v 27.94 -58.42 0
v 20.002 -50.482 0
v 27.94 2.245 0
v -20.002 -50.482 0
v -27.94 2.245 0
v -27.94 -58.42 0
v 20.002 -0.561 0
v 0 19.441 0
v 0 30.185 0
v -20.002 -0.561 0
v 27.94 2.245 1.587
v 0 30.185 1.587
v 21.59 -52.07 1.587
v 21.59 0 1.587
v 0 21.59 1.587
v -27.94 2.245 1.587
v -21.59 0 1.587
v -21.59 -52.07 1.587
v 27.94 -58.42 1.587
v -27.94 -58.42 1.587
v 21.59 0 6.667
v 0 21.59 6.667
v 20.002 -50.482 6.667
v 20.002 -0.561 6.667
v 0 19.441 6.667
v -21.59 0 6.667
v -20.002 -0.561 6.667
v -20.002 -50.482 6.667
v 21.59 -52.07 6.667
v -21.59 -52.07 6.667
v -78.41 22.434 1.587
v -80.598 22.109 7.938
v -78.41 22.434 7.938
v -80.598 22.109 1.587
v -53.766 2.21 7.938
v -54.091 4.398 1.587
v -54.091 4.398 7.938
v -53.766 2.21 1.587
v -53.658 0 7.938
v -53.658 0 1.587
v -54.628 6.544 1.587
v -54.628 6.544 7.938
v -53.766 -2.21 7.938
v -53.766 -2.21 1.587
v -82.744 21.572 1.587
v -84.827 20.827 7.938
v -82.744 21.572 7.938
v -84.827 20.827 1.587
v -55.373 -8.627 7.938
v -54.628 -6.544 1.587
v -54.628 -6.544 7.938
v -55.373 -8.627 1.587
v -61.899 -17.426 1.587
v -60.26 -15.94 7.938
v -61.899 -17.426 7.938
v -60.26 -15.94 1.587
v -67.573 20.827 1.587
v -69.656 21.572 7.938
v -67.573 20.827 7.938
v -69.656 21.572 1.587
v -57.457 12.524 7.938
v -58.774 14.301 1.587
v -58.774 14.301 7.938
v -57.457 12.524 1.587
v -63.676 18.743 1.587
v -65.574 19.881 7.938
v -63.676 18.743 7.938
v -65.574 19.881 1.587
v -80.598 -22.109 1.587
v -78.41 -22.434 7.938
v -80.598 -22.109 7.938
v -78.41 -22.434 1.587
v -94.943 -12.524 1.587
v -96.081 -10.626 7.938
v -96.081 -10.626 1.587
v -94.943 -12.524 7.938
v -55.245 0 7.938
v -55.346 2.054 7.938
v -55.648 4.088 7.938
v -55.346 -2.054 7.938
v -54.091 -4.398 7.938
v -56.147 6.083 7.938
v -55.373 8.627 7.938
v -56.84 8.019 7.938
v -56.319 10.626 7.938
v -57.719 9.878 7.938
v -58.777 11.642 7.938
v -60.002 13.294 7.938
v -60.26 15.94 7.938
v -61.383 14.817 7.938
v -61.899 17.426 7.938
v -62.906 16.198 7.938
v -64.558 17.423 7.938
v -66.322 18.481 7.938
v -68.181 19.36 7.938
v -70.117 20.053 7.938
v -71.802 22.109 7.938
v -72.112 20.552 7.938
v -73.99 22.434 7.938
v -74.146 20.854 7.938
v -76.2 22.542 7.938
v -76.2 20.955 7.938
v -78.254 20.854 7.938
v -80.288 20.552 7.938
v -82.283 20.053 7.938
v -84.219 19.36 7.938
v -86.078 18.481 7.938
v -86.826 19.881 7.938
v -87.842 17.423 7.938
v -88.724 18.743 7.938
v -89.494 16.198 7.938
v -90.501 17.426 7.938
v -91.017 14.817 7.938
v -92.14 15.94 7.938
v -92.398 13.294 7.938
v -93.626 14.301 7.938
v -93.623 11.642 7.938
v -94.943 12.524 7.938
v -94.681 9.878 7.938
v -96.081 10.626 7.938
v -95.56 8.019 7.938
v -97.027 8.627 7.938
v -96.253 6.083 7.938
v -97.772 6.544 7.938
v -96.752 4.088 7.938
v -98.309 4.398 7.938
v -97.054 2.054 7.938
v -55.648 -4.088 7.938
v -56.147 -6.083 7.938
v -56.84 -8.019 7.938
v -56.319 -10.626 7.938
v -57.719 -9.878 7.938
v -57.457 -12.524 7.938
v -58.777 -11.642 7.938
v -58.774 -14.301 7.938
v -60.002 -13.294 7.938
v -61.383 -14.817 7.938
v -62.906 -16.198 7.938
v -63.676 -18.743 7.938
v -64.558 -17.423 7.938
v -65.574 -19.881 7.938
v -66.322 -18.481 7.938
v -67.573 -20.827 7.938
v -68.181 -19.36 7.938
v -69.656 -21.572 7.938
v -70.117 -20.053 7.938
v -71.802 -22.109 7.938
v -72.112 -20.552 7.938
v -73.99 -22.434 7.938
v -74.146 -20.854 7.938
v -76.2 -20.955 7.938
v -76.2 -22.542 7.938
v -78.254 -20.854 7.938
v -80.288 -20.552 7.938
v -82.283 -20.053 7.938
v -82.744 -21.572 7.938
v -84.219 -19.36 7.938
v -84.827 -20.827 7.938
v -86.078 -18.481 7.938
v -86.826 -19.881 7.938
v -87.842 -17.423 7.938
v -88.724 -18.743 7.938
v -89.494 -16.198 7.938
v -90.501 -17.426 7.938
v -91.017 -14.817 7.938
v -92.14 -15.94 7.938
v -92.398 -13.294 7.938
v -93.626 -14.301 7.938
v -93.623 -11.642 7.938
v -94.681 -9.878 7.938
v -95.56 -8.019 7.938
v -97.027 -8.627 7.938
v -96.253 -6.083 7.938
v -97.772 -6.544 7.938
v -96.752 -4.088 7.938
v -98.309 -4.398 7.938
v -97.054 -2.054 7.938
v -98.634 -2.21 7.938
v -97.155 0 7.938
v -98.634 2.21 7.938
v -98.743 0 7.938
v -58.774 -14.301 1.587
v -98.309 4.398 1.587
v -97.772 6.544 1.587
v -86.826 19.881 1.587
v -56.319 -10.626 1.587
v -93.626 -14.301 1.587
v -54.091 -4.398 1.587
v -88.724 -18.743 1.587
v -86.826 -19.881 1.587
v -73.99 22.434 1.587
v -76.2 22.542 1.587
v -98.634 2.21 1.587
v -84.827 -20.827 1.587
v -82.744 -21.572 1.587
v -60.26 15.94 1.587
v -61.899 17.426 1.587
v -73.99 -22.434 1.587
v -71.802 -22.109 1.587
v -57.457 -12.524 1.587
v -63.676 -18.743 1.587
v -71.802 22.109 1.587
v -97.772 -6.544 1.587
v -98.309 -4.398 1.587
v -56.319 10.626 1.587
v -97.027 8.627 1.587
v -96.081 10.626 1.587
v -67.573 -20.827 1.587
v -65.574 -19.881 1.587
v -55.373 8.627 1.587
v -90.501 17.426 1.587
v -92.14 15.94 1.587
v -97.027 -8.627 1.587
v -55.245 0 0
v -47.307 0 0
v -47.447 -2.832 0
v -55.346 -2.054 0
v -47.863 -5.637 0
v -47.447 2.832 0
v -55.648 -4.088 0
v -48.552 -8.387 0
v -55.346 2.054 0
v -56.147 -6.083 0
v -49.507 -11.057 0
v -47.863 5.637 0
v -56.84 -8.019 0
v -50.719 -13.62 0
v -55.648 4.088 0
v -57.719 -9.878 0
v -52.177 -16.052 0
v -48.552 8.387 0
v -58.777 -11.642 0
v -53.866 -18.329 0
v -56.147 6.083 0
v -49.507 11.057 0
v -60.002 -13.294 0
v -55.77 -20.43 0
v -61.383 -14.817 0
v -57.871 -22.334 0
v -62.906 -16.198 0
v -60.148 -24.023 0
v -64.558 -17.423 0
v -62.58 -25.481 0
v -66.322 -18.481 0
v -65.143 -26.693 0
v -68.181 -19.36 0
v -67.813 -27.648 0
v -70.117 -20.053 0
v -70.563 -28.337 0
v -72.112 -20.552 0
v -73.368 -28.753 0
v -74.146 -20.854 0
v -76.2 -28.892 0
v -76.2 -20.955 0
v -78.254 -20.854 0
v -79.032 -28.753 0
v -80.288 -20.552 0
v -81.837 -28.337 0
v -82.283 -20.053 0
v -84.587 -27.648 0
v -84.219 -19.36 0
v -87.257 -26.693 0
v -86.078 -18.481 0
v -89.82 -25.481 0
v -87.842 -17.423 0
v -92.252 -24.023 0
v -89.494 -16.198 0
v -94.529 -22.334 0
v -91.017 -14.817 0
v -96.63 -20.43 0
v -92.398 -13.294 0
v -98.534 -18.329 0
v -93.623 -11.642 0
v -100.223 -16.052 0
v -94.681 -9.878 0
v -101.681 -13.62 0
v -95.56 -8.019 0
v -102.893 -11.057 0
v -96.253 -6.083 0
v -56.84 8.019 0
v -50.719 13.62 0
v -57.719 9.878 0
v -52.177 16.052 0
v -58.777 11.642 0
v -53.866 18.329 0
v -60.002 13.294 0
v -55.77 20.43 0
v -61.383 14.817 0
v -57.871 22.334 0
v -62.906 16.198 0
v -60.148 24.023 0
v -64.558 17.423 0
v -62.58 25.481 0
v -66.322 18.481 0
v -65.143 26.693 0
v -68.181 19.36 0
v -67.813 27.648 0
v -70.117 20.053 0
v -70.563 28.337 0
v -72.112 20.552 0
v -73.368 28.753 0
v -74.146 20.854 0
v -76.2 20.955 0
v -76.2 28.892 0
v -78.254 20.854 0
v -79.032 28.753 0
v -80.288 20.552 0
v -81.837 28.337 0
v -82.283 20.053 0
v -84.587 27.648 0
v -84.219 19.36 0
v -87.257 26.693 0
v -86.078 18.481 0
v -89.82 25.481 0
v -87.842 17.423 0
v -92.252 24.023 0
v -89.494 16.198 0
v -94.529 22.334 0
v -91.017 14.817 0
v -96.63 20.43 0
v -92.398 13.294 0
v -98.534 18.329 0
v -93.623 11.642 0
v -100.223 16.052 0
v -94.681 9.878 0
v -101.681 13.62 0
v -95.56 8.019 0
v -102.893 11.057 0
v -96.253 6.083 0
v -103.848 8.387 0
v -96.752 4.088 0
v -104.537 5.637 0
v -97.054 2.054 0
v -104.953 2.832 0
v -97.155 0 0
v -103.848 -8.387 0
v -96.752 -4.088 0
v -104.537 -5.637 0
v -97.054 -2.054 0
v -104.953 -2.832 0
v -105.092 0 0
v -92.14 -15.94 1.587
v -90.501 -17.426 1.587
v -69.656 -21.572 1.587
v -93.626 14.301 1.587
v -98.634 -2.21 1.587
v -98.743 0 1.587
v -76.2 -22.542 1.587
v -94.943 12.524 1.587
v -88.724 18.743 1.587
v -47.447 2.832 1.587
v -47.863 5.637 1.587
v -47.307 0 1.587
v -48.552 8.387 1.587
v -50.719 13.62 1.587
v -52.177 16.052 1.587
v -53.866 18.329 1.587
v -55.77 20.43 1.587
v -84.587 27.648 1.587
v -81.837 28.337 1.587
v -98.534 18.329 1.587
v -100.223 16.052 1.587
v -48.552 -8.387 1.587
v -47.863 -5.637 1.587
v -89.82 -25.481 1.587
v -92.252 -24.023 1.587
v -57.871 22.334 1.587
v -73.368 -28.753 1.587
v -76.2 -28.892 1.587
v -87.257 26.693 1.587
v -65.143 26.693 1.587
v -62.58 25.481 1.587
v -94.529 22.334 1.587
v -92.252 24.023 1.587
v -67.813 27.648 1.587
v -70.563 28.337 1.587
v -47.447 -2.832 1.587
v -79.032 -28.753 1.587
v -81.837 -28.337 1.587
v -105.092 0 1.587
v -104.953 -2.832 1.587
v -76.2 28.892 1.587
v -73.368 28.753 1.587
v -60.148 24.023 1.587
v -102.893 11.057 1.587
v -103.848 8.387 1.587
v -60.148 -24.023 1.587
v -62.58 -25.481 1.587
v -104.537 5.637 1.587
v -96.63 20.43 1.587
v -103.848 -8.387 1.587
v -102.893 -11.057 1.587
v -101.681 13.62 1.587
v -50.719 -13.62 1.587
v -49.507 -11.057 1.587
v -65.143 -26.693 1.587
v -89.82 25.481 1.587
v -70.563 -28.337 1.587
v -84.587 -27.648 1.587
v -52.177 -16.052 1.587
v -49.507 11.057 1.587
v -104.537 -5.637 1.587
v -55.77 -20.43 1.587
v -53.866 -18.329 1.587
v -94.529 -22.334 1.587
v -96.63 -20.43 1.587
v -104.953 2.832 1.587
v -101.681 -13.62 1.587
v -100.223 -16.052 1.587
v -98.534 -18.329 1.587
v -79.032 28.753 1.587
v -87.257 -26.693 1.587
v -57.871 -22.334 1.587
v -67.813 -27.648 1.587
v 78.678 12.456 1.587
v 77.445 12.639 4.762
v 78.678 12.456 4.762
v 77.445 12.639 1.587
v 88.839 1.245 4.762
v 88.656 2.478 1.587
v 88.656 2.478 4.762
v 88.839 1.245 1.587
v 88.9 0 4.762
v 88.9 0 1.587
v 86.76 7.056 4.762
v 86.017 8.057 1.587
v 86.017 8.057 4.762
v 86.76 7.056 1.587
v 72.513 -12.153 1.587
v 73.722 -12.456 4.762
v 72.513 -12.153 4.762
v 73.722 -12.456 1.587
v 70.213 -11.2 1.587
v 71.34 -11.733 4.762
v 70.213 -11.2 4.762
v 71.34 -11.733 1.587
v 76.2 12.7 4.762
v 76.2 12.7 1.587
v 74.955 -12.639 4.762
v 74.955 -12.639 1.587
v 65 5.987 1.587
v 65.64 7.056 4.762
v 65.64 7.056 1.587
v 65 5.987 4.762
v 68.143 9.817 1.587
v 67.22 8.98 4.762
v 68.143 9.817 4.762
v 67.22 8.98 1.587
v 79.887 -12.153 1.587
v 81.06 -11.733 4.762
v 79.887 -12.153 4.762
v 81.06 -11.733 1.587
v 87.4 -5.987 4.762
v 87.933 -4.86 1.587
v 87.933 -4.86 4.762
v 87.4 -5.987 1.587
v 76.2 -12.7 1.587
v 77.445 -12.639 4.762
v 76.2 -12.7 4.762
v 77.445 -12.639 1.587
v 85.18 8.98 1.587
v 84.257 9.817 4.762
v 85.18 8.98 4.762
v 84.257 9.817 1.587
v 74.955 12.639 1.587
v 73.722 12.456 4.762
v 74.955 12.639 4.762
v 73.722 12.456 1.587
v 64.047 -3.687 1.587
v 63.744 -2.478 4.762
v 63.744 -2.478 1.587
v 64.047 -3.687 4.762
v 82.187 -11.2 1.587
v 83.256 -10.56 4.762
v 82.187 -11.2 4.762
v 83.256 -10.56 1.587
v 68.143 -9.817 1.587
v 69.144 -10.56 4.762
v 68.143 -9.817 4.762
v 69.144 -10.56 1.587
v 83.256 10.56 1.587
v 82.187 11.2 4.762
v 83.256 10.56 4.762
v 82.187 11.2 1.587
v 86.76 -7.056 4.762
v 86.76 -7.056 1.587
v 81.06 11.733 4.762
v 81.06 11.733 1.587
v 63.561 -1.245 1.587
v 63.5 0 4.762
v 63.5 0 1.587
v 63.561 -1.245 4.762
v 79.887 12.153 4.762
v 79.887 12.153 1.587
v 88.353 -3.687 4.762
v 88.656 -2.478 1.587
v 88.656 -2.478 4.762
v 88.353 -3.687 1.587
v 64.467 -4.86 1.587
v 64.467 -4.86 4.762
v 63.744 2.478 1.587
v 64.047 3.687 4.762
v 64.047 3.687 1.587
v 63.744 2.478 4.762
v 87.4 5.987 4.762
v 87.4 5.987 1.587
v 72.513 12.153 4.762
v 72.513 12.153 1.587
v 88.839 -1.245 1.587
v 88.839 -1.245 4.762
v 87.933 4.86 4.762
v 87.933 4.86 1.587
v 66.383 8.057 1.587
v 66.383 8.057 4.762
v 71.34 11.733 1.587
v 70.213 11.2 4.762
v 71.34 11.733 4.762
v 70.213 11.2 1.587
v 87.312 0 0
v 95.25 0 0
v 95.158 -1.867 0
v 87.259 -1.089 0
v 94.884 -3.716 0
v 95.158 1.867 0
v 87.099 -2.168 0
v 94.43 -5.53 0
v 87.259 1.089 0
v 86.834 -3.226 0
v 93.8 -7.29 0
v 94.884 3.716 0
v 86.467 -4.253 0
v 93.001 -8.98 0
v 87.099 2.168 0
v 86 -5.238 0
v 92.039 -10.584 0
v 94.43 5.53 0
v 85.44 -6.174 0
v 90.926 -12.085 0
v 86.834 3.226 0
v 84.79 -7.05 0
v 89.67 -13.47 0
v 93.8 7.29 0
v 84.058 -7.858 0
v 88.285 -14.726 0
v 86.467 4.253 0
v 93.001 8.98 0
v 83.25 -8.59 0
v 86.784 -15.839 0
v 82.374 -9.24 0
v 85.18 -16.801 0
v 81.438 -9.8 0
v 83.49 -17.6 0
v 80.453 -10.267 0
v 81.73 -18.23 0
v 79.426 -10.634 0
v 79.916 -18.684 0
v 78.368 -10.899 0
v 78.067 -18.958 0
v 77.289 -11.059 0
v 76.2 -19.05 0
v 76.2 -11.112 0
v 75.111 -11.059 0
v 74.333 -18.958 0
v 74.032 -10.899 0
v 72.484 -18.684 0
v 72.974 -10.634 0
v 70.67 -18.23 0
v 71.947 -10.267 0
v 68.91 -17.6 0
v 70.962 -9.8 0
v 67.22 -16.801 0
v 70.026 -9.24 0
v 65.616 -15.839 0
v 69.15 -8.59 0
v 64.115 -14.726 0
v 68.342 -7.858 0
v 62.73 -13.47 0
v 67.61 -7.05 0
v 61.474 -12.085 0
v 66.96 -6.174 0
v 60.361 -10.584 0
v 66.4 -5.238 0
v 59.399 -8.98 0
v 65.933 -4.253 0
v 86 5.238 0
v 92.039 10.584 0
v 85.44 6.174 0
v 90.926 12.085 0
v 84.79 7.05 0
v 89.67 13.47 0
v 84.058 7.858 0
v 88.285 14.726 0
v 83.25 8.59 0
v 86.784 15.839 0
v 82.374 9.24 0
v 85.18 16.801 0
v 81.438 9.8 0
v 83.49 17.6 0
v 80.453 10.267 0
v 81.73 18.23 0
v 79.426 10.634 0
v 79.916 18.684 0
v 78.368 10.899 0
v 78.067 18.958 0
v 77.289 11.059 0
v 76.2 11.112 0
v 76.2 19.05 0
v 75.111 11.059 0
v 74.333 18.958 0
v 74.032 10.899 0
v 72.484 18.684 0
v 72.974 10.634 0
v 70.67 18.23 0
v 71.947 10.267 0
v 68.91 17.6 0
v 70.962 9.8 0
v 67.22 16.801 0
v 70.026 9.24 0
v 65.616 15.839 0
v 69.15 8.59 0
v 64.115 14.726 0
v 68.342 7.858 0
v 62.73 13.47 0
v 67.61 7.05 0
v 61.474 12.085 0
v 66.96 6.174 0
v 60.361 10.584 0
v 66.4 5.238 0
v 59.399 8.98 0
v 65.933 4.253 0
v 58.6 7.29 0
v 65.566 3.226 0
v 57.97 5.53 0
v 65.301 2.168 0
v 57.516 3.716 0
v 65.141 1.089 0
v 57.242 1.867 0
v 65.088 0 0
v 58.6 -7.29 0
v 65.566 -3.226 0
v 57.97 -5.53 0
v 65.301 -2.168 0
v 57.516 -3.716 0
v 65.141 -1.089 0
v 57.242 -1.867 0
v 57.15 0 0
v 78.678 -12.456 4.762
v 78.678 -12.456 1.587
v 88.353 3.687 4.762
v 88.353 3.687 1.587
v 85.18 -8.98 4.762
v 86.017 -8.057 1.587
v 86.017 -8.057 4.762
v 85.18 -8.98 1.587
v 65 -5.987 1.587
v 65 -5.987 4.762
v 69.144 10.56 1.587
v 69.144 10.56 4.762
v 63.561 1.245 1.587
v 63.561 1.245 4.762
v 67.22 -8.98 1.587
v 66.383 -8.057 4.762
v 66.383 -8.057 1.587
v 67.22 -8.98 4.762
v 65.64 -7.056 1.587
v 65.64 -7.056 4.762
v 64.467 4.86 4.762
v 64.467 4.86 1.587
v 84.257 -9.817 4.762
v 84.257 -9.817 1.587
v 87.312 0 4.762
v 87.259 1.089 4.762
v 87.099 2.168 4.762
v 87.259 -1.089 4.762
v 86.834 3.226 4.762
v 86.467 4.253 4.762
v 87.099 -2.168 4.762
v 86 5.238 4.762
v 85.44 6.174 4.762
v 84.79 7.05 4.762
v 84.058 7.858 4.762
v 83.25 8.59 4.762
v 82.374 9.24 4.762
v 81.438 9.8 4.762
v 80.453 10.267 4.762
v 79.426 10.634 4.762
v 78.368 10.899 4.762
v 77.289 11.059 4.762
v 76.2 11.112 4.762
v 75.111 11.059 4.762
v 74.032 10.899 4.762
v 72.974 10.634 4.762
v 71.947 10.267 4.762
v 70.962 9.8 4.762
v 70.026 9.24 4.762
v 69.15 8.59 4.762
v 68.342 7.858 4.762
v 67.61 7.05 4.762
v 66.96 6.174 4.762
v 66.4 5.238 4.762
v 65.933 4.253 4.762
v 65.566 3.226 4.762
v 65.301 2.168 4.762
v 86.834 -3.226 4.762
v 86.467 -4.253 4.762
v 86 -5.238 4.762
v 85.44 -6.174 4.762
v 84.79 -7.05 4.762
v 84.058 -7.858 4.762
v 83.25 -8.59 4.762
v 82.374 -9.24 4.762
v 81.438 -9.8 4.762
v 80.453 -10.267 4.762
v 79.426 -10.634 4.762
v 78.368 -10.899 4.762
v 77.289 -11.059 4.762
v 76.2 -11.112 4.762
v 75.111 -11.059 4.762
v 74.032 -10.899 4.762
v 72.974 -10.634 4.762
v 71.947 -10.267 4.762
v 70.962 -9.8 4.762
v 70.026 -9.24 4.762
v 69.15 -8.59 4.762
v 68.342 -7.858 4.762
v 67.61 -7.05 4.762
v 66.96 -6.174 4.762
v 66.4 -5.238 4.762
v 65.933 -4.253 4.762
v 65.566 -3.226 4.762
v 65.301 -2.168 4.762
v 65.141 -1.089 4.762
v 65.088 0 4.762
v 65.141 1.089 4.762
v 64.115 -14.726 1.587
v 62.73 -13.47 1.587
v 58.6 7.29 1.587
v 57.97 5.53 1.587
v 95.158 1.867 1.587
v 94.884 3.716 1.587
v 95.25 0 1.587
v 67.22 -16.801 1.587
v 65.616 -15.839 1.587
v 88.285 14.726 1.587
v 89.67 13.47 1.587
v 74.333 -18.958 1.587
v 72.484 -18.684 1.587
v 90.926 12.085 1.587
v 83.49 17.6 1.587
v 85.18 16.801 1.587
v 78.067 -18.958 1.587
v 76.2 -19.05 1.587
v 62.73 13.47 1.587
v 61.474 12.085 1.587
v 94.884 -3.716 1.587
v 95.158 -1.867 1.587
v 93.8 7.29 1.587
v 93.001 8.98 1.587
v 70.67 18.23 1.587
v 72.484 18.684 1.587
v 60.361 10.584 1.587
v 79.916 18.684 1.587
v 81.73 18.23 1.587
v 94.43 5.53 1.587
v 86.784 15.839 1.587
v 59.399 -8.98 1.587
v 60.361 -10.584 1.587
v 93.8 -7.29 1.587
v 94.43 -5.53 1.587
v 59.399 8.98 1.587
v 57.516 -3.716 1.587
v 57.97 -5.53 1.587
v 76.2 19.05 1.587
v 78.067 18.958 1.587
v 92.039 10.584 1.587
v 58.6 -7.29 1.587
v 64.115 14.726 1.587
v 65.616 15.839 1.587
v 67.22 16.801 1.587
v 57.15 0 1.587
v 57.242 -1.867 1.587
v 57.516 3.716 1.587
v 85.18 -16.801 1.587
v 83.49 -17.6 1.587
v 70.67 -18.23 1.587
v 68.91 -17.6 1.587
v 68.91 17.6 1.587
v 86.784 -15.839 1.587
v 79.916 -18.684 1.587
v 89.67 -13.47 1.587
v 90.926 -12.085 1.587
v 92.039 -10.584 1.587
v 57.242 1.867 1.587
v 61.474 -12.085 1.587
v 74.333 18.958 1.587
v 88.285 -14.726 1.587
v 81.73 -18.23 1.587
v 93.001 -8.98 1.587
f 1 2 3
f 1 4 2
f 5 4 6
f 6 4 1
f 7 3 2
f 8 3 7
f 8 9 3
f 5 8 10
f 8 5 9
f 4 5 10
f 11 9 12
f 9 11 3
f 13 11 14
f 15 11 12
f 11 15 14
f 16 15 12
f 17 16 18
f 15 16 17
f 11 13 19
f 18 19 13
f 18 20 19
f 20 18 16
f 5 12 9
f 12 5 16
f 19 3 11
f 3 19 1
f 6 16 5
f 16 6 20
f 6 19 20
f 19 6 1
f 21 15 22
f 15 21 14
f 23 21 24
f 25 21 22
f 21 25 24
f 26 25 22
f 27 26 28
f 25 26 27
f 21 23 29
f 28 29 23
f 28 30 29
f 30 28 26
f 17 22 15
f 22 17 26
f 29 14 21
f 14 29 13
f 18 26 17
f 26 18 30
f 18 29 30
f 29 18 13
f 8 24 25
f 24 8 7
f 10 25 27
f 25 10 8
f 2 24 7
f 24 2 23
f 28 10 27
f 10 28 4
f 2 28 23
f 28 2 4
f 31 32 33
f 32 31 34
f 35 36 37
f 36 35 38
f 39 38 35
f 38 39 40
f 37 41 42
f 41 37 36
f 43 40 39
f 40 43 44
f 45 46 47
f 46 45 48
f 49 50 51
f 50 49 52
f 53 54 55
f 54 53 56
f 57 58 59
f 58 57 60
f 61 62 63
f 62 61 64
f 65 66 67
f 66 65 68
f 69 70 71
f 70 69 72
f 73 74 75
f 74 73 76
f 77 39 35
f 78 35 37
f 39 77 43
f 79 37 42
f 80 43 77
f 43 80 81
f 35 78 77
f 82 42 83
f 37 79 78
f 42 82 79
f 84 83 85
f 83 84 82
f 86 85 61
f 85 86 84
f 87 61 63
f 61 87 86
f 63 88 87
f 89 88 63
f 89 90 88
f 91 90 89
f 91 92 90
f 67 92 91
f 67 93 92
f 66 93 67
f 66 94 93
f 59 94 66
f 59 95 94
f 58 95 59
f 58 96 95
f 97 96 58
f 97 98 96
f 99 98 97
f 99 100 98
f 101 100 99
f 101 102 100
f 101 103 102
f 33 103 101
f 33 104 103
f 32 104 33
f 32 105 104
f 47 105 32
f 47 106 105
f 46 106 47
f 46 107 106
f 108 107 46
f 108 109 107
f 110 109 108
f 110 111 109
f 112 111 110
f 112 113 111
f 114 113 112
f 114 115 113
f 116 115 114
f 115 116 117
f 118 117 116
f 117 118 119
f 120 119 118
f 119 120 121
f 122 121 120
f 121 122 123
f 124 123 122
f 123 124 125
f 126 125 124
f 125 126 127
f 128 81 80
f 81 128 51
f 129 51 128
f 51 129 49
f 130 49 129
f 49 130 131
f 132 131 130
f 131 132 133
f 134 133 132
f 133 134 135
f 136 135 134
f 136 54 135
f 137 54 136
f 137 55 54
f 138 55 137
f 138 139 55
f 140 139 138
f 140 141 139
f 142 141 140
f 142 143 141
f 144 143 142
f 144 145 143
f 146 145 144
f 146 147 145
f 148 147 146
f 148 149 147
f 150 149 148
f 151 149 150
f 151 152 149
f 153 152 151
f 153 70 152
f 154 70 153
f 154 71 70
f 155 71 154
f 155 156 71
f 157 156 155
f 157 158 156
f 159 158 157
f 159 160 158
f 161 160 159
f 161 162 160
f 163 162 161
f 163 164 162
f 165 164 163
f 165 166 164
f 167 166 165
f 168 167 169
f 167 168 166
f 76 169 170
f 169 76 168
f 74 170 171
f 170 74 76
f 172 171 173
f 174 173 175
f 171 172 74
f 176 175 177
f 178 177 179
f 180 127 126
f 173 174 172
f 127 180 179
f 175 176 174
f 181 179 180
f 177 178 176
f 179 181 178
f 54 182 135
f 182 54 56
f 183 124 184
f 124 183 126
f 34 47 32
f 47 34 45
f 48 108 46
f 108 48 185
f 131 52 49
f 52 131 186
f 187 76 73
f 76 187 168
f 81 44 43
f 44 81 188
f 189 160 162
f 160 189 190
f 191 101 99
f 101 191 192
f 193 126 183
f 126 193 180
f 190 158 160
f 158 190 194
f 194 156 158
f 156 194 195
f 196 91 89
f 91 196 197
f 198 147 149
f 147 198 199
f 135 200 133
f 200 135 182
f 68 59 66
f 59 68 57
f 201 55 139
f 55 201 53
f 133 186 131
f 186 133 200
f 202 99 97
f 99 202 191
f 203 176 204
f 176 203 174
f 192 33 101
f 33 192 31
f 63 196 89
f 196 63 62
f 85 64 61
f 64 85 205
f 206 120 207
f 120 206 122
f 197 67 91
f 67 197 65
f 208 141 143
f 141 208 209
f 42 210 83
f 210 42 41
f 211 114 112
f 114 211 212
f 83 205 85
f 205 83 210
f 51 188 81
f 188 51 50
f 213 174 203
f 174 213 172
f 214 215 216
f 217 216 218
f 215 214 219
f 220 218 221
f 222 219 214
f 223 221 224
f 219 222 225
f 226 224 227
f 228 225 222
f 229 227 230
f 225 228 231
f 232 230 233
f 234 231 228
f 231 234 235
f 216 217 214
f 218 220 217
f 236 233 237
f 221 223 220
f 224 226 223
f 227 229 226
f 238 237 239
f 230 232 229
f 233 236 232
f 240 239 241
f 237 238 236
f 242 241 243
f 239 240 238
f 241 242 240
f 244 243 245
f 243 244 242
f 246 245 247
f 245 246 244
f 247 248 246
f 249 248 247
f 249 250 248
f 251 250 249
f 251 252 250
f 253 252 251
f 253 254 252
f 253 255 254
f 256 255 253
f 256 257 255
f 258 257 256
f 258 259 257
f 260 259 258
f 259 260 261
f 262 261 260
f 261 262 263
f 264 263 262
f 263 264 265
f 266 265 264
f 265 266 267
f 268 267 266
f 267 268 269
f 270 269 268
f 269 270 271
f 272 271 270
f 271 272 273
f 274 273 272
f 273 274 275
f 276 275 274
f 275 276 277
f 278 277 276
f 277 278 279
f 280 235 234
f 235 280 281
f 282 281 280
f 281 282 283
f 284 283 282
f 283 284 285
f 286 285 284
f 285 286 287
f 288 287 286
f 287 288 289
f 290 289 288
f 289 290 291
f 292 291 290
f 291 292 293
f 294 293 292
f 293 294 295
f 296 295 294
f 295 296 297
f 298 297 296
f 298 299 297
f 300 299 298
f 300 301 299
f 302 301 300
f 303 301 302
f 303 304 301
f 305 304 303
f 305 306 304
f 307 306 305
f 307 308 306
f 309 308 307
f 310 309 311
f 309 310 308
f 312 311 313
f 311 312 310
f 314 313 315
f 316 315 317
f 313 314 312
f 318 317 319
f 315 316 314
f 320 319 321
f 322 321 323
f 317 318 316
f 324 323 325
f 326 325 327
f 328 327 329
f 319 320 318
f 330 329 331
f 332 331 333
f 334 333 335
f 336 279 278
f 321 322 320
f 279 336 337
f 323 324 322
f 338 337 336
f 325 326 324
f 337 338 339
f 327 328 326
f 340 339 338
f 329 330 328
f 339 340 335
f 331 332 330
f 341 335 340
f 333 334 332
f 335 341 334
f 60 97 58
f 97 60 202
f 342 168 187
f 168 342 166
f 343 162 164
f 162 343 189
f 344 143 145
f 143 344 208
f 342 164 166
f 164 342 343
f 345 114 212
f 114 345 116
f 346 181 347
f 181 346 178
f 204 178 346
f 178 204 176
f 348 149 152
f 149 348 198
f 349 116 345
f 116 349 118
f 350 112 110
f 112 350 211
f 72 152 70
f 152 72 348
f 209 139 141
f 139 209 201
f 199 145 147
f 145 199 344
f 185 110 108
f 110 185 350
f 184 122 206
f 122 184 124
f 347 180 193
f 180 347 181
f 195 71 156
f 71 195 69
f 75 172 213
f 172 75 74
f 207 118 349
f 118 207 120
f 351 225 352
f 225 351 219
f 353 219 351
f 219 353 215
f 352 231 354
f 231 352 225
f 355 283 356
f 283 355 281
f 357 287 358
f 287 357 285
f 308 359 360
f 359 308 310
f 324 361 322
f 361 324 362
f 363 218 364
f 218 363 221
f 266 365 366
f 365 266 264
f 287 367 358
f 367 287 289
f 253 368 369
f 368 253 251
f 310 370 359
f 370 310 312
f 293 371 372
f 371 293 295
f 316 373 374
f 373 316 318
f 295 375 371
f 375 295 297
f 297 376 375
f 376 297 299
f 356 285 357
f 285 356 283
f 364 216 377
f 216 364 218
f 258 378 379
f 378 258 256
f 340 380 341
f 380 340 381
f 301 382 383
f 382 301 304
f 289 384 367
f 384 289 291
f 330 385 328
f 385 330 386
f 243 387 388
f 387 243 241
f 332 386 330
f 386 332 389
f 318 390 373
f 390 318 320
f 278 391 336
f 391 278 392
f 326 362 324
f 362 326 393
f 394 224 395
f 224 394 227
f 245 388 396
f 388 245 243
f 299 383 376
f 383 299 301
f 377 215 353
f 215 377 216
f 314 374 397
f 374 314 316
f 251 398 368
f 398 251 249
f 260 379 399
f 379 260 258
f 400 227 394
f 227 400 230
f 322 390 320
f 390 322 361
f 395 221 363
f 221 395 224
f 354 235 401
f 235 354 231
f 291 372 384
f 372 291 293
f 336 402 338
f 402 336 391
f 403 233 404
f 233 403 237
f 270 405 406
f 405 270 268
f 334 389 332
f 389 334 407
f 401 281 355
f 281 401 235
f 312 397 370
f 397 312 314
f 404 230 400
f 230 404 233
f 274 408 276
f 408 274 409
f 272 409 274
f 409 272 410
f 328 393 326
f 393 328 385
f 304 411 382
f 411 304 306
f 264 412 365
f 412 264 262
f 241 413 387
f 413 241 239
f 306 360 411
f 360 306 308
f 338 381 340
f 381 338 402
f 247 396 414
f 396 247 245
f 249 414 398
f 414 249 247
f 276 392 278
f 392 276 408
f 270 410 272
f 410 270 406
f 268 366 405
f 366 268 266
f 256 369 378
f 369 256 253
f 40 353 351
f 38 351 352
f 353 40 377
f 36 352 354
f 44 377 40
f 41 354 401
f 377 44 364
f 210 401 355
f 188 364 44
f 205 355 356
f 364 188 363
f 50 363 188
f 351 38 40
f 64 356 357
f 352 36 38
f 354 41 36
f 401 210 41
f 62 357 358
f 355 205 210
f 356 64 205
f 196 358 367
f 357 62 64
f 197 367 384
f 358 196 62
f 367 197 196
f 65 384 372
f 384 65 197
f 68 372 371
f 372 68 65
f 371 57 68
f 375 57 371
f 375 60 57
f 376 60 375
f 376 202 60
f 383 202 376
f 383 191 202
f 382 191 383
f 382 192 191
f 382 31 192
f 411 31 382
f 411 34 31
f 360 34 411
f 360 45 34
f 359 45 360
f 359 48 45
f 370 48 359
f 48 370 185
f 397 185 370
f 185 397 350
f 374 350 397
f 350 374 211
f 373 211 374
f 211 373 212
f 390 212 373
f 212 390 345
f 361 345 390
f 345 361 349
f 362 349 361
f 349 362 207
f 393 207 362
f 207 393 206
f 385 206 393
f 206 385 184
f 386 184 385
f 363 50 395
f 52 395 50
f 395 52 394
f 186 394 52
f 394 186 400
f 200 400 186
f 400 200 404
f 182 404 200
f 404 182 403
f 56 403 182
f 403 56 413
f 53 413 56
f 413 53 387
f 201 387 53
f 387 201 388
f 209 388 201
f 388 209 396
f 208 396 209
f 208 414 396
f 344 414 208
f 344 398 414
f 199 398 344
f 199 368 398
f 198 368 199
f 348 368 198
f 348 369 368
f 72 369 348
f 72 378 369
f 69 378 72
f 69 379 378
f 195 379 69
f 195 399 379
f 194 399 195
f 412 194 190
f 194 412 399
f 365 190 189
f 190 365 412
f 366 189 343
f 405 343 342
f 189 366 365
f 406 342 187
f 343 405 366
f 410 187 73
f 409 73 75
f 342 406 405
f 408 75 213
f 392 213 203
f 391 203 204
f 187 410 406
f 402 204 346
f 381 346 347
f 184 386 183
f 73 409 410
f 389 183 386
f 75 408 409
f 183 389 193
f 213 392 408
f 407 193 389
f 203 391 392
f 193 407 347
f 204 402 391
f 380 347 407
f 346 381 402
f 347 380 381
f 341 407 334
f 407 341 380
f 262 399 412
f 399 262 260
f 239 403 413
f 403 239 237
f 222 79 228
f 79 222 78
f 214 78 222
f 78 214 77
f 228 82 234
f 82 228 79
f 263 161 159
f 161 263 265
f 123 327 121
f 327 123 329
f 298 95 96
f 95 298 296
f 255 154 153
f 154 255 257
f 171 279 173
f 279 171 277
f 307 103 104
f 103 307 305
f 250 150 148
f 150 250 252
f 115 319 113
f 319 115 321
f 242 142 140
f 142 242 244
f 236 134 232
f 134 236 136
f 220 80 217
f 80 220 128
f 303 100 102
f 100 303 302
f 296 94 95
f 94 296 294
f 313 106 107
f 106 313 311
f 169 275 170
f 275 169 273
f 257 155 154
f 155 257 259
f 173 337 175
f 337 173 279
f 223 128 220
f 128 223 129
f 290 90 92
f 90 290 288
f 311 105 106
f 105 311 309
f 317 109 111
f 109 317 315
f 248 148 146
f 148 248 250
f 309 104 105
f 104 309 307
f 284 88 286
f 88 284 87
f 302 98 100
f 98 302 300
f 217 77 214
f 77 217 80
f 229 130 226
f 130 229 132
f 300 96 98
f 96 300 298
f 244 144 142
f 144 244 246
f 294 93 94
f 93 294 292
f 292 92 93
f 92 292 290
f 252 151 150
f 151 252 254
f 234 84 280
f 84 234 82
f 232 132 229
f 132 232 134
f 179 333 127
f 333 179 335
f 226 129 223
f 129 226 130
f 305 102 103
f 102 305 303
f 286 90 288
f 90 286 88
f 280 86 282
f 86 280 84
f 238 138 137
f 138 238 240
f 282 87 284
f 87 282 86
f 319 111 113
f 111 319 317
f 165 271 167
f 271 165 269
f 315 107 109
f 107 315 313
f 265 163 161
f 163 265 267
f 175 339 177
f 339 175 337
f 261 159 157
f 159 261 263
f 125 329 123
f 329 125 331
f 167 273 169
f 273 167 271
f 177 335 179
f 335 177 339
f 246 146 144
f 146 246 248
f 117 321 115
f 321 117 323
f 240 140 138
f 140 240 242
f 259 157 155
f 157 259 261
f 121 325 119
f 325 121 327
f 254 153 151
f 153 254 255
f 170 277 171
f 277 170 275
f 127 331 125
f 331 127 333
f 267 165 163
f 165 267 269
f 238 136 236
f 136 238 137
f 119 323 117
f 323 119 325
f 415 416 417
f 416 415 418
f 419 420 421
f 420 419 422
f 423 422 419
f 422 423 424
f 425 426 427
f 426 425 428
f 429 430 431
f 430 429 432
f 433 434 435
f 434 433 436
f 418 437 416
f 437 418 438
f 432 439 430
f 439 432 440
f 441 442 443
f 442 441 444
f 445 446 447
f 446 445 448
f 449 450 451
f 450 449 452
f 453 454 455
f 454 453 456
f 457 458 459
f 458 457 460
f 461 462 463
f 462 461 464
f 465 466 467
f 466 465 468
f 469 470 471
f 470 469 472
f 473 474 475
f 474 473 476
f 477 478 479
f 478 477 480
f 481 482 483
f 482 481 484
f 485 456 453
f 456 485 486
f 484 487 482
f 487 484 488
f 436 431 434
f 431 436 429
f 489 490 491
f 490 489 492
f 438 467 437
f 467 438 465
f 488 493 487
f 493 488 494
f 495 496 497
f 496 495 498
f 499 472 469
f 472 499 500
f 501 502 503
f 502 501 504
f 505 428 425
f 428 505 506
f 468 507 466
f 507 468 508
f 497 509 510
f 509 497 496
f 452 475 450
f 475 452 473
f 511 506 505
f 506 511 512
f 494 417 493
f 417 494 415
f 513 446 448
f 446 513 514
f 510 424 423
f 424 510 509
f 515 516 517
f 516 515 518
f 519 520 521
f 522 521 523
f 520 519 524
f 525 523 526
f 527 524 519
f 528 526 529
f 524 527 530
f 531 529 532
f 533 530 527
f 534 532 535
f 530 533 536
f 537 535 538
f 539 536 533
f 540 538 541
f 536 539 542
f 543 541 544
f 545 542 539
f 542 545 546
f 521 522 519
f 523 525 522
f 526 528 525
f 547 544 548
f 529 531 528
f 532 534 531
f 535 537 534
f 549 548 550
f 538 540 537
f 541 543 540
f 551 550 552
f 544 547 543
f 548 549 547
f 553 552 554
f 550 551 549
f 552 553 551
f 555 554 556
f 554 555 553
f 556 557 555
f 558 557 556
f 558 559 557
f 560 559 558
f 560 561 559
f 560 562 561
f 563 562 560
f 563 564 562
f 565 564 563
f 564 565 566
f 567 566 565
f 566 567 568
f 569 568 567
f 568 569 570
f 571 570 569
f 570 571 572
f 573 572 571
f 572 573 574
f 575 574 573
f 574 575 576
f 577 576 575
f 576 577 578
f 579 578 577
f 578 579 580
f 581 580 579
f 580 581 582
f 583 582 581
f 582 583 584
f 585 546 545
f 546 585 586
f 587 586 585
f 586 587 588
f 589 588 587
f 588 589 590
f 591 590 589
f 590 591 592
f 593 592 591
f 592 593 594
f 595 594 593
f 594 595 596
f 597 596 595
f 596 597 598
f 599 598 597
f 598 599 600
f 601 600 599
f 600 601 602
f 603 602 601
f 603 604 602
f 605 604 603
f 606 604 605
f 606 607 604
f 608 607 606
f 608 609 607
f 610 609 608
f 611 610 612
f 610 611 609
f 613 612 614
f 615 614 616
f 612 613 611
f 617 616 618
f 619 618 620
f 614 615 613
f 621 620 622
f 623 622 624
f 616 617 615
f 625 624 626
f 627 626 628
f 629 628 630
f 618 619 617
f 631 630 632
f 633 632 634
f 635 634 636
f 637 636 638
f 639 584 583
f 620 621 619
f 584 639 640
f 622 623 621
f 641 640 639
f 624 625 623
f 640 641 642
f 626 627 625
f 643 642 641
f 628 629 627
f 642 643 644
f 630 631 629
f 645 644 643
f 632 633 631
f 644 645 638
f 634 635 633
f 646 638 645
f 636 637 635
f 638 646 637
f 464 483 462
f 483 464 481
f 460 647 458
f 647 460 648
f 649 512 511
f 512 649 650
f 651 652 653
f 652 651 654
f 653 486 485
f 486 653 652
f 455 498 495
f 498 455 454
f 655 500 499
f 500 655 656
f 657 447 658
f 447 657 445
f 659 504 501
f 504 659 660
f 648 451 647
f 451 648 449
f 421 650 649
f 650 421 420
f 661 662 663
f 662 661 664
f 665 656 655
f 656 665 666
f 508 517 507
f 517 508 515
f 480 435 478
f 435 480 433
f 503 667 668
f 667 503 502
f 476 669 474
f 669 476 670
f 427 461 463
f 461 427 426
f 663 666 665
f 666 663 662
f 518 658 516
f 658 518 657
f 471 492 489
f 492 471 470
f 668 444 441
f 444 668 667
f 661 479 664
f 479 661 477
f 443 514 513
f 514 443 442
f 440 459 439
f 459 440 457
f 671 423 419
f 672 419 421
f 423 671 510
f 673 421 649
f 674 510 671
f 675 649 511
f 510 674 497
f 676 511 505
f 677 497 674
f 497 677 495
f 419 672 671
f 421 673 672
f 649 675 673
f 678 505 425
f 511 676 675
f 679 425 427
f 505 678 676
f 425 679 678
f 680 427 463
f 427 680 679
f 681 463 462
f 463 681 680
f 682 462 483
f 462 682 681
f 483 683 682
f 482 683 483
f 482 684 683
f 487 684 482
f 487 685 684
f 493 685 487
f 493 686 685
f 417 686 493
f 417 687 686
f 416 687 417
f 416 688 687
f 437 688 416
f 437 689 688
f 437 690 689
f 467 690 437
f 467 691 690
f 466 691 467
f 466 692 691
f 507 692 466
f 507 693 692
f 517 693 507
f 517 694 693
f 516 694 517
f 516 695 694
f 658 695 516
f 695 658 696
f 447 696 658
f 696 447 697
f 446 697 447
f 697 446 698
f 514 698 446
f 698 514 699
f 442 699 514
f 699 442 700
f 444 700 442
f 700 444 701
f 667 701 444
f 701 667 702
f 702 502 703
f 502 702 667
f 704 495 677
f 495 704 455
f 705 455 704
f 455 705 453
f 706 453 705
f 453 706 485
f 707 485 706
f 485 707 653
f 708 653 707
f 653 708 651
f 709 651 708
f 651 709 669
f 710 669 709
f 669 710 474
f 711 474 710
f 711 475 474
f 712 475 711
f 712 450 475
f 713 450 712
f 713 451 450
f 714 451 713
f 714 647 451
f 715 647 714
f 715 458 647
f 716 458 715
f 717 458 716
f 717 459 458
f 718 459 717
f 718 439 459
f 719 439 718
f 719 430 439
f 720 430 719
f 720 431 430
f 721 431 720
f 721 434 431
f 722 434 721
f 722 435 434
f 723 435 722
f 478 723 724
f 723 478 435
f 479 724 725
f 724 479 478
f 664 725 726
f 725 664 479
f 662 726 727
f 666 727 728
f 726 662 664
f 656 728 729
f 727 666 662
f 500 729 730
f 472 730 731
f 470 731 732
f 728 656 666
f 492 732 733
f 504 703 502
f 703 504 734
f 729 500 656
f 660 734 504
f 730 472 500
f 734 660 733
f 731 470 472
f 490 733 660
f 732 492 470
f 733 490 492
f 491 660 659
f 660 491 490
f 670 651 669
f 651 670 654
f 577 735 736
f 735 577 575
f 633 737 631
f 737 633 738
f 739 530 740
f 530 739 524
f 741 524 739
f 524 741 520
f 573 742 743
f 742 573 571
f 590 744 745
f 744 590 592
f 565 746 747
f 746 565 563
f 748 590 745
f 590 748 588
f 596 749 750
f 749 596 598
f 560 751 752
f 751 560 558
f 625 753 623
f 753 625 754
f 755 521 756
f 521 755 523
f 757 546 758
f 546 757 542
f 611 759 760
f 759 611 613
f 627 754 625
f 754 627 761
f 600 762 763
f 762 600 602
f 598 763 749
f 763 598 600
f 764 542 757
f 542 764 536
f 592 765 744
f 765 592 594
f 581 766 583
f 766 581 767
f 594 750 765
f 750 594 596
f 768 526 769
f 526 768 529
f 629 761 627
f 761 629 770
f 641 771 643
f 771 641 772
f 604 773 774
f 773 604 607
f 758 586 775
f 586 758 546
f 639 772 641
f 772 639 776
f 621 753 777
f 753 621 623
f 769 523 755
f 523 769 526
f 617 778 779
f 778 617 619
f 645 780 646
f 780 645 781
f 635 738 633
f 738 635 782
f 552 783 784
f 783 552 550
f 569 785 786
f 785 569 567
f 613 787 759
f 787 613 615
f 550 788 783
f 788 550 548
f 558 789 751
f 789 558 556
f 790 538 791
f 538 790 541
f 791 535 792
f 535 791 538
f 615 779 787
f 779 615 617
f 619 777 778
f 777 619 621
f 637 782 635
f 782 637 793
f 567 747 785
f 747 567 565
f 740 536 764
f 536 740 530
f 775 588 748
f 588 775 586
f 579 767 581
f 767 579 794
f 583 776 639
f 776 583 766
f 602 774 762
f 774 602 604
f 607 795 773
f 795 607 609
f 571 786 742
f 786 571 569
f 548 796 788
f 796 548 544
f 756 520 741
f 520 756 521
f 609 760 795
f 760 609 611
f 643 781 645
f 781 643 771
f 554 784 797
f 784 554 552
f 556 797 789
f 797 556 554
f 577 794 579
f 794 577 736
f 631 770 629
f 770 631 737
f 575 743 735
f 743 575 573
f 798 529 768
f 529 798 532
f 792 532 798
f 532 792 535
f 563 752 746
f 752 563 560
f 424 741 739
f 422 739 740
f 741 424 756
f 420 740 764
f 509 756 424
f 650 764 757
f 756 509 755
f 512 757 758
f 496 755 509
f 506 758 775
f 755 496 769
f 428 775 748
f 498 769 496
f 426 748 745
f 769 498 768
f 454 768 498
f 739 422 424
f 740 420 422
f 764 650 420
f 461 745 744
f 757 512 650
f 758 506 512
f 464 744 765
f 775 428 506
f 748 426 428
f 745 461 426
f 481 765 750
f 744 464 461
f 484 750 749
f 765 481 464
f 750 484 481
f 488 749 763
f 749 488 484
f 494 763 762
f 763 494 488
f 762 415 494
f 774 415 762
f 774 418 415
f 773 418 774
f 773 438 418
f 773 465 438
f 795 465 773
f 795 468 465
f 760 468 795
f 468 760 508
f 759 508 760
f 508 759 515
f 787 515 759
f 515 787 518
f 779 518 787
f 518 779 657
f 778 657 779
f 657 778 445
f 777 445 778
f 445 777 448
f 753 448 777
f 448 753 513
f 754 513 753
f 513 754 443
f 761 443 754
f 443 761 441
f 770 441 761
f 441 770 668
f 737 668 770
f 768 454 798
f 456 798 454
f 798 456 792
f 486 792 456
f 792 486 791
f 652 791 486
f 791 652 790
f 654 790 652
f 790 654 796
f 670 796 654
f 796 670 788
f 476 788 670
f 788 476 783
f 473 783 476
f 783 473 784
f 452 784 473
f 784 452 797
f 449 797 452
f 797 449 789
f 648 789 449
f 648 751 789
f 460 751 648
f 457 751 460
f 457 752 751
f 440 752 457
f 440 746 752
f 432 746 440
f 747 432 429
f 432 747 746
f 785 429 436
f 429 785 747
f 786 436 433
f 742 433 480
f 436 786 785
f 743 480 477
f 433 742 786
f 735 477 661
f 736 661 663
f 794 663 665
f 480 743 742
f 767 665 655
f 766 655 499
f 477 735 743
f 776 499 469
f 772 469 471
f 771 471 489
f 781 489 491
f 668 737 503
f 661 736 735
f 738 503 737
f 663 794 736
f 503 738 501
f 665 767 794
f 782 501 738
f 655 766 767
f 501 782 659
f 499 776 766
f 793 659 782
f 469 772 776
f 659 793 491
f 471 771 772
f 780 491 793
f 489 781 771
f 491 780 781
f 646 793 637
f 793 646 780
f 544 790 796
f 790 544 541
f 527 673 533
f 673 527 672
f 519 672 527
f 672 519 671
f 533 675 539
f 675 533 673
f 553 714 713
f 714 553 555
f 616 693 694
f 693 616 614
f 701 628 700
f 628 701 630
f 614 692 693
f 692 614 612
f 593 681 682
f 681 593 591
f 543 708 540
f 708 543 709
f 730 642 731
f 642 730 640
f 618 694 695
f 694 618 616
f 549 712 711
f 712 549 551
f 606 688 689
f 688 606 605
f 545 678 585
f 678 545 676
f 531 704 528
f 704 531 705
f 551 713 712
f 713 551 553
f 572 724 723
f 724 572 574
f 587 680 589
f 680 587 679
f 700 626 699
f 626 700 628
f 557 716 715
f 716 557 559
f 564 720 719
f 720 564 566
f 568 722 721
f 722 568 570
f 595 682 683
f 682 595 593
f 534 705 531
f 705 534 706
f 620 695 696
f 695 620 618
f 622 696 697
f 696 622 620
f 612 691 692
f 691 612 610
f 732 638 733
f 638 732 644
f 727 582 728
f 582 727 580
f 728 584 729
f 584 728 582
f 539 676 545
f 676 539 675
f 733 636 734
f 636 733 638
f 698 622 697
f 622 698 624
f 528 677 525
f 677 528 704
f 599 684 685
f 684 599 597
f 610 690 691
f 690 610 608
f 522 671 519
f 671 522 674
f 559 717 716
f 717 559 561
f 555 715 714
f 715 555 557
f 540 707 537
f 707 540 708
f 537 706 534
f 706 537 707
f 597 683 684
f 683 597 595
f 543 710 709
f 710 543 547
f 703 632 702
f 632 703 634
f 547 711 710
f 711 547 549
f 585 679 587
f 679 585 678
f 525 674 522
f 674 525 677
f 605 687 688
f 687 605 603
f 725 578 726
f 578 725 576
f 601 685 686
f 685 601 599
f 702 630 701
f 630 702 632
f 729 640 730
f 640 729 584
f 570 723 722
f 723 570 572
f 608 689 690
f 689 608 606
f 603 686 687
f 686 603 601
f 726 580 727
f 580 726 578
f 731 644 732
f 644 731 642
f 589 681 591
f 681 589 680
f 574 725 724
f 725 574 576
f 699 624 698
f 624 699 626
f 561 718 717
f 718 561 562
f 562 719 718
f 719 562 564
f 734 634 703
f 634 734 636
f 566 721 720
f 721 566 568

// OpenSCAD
mm=1;
cm=10*mm;
in=25.4*mm;


module window_silhouette(width, height){
    union(){
        translate([0,-height/2])
        square([width, height],center=true);
        rotate(45)
        square(sqrt(2)/2*width, center=true);
        
    }
}

hole_width=1.7*in;
hole_height=2.05*in;
board_width = 1/4*in;
board_th = 1/16*in;
attic_wall_th = 0.4*in;
wood_wall_th = 0.5*in;



module window_frame(){
    inner_width = hole_width-2*board_th;
    inner_height = hole_height - (1+sqrt(2)/4)*board_th;
    
    outer_width = hole_width+2*board_width;
    outer_height = hole_height + (1+sqrt(2)/4)*board_width;
    windowsill_width=board_th + attic_wall_th/2;
    
    difference(){
        union(){
            translate([0,+sqrt(2)/4*board_width],0)
            linear_extrude(board_th)
            window_silhouette(outer_width, outer_height);
            linear_extrude(windowsill_width)
            window_silhouette(hole_width, hole_height);
        }
        translate([0,-sqrt(2)/4*board_th],0)
        linear_extrude(4*windowsill_width,center=true)
        window_silhouette(inner_width, inner_height);
    }
    
}

module round_side_window_frame(round_hole_dia, wall_th) {
    $fn=64;
    hole_rad = round_hole_dia/2;
    inner_hole_rad= hole_rad-board_th;
    outer_hole_rad = hole_rad + board_width;
    windowsill_width=board_th + wall_th/2;
    
    difference(){
        
        
        union(){
            cylinder(r=hole_rad,h=windowsill_width);
            cylinder(r=outer_hole_rad,h=board_th);
        }
        cylinder(r=inner_hole_rad,h=4*windowsill_width, center=true);
    }
}

window_frame();

translate([-3*in,0,0])
round_side_window_frame(1.775*in, 0.5*in);

translate([3*in,0,0])
round_side_window_frame(1*in, 0.25*in);
